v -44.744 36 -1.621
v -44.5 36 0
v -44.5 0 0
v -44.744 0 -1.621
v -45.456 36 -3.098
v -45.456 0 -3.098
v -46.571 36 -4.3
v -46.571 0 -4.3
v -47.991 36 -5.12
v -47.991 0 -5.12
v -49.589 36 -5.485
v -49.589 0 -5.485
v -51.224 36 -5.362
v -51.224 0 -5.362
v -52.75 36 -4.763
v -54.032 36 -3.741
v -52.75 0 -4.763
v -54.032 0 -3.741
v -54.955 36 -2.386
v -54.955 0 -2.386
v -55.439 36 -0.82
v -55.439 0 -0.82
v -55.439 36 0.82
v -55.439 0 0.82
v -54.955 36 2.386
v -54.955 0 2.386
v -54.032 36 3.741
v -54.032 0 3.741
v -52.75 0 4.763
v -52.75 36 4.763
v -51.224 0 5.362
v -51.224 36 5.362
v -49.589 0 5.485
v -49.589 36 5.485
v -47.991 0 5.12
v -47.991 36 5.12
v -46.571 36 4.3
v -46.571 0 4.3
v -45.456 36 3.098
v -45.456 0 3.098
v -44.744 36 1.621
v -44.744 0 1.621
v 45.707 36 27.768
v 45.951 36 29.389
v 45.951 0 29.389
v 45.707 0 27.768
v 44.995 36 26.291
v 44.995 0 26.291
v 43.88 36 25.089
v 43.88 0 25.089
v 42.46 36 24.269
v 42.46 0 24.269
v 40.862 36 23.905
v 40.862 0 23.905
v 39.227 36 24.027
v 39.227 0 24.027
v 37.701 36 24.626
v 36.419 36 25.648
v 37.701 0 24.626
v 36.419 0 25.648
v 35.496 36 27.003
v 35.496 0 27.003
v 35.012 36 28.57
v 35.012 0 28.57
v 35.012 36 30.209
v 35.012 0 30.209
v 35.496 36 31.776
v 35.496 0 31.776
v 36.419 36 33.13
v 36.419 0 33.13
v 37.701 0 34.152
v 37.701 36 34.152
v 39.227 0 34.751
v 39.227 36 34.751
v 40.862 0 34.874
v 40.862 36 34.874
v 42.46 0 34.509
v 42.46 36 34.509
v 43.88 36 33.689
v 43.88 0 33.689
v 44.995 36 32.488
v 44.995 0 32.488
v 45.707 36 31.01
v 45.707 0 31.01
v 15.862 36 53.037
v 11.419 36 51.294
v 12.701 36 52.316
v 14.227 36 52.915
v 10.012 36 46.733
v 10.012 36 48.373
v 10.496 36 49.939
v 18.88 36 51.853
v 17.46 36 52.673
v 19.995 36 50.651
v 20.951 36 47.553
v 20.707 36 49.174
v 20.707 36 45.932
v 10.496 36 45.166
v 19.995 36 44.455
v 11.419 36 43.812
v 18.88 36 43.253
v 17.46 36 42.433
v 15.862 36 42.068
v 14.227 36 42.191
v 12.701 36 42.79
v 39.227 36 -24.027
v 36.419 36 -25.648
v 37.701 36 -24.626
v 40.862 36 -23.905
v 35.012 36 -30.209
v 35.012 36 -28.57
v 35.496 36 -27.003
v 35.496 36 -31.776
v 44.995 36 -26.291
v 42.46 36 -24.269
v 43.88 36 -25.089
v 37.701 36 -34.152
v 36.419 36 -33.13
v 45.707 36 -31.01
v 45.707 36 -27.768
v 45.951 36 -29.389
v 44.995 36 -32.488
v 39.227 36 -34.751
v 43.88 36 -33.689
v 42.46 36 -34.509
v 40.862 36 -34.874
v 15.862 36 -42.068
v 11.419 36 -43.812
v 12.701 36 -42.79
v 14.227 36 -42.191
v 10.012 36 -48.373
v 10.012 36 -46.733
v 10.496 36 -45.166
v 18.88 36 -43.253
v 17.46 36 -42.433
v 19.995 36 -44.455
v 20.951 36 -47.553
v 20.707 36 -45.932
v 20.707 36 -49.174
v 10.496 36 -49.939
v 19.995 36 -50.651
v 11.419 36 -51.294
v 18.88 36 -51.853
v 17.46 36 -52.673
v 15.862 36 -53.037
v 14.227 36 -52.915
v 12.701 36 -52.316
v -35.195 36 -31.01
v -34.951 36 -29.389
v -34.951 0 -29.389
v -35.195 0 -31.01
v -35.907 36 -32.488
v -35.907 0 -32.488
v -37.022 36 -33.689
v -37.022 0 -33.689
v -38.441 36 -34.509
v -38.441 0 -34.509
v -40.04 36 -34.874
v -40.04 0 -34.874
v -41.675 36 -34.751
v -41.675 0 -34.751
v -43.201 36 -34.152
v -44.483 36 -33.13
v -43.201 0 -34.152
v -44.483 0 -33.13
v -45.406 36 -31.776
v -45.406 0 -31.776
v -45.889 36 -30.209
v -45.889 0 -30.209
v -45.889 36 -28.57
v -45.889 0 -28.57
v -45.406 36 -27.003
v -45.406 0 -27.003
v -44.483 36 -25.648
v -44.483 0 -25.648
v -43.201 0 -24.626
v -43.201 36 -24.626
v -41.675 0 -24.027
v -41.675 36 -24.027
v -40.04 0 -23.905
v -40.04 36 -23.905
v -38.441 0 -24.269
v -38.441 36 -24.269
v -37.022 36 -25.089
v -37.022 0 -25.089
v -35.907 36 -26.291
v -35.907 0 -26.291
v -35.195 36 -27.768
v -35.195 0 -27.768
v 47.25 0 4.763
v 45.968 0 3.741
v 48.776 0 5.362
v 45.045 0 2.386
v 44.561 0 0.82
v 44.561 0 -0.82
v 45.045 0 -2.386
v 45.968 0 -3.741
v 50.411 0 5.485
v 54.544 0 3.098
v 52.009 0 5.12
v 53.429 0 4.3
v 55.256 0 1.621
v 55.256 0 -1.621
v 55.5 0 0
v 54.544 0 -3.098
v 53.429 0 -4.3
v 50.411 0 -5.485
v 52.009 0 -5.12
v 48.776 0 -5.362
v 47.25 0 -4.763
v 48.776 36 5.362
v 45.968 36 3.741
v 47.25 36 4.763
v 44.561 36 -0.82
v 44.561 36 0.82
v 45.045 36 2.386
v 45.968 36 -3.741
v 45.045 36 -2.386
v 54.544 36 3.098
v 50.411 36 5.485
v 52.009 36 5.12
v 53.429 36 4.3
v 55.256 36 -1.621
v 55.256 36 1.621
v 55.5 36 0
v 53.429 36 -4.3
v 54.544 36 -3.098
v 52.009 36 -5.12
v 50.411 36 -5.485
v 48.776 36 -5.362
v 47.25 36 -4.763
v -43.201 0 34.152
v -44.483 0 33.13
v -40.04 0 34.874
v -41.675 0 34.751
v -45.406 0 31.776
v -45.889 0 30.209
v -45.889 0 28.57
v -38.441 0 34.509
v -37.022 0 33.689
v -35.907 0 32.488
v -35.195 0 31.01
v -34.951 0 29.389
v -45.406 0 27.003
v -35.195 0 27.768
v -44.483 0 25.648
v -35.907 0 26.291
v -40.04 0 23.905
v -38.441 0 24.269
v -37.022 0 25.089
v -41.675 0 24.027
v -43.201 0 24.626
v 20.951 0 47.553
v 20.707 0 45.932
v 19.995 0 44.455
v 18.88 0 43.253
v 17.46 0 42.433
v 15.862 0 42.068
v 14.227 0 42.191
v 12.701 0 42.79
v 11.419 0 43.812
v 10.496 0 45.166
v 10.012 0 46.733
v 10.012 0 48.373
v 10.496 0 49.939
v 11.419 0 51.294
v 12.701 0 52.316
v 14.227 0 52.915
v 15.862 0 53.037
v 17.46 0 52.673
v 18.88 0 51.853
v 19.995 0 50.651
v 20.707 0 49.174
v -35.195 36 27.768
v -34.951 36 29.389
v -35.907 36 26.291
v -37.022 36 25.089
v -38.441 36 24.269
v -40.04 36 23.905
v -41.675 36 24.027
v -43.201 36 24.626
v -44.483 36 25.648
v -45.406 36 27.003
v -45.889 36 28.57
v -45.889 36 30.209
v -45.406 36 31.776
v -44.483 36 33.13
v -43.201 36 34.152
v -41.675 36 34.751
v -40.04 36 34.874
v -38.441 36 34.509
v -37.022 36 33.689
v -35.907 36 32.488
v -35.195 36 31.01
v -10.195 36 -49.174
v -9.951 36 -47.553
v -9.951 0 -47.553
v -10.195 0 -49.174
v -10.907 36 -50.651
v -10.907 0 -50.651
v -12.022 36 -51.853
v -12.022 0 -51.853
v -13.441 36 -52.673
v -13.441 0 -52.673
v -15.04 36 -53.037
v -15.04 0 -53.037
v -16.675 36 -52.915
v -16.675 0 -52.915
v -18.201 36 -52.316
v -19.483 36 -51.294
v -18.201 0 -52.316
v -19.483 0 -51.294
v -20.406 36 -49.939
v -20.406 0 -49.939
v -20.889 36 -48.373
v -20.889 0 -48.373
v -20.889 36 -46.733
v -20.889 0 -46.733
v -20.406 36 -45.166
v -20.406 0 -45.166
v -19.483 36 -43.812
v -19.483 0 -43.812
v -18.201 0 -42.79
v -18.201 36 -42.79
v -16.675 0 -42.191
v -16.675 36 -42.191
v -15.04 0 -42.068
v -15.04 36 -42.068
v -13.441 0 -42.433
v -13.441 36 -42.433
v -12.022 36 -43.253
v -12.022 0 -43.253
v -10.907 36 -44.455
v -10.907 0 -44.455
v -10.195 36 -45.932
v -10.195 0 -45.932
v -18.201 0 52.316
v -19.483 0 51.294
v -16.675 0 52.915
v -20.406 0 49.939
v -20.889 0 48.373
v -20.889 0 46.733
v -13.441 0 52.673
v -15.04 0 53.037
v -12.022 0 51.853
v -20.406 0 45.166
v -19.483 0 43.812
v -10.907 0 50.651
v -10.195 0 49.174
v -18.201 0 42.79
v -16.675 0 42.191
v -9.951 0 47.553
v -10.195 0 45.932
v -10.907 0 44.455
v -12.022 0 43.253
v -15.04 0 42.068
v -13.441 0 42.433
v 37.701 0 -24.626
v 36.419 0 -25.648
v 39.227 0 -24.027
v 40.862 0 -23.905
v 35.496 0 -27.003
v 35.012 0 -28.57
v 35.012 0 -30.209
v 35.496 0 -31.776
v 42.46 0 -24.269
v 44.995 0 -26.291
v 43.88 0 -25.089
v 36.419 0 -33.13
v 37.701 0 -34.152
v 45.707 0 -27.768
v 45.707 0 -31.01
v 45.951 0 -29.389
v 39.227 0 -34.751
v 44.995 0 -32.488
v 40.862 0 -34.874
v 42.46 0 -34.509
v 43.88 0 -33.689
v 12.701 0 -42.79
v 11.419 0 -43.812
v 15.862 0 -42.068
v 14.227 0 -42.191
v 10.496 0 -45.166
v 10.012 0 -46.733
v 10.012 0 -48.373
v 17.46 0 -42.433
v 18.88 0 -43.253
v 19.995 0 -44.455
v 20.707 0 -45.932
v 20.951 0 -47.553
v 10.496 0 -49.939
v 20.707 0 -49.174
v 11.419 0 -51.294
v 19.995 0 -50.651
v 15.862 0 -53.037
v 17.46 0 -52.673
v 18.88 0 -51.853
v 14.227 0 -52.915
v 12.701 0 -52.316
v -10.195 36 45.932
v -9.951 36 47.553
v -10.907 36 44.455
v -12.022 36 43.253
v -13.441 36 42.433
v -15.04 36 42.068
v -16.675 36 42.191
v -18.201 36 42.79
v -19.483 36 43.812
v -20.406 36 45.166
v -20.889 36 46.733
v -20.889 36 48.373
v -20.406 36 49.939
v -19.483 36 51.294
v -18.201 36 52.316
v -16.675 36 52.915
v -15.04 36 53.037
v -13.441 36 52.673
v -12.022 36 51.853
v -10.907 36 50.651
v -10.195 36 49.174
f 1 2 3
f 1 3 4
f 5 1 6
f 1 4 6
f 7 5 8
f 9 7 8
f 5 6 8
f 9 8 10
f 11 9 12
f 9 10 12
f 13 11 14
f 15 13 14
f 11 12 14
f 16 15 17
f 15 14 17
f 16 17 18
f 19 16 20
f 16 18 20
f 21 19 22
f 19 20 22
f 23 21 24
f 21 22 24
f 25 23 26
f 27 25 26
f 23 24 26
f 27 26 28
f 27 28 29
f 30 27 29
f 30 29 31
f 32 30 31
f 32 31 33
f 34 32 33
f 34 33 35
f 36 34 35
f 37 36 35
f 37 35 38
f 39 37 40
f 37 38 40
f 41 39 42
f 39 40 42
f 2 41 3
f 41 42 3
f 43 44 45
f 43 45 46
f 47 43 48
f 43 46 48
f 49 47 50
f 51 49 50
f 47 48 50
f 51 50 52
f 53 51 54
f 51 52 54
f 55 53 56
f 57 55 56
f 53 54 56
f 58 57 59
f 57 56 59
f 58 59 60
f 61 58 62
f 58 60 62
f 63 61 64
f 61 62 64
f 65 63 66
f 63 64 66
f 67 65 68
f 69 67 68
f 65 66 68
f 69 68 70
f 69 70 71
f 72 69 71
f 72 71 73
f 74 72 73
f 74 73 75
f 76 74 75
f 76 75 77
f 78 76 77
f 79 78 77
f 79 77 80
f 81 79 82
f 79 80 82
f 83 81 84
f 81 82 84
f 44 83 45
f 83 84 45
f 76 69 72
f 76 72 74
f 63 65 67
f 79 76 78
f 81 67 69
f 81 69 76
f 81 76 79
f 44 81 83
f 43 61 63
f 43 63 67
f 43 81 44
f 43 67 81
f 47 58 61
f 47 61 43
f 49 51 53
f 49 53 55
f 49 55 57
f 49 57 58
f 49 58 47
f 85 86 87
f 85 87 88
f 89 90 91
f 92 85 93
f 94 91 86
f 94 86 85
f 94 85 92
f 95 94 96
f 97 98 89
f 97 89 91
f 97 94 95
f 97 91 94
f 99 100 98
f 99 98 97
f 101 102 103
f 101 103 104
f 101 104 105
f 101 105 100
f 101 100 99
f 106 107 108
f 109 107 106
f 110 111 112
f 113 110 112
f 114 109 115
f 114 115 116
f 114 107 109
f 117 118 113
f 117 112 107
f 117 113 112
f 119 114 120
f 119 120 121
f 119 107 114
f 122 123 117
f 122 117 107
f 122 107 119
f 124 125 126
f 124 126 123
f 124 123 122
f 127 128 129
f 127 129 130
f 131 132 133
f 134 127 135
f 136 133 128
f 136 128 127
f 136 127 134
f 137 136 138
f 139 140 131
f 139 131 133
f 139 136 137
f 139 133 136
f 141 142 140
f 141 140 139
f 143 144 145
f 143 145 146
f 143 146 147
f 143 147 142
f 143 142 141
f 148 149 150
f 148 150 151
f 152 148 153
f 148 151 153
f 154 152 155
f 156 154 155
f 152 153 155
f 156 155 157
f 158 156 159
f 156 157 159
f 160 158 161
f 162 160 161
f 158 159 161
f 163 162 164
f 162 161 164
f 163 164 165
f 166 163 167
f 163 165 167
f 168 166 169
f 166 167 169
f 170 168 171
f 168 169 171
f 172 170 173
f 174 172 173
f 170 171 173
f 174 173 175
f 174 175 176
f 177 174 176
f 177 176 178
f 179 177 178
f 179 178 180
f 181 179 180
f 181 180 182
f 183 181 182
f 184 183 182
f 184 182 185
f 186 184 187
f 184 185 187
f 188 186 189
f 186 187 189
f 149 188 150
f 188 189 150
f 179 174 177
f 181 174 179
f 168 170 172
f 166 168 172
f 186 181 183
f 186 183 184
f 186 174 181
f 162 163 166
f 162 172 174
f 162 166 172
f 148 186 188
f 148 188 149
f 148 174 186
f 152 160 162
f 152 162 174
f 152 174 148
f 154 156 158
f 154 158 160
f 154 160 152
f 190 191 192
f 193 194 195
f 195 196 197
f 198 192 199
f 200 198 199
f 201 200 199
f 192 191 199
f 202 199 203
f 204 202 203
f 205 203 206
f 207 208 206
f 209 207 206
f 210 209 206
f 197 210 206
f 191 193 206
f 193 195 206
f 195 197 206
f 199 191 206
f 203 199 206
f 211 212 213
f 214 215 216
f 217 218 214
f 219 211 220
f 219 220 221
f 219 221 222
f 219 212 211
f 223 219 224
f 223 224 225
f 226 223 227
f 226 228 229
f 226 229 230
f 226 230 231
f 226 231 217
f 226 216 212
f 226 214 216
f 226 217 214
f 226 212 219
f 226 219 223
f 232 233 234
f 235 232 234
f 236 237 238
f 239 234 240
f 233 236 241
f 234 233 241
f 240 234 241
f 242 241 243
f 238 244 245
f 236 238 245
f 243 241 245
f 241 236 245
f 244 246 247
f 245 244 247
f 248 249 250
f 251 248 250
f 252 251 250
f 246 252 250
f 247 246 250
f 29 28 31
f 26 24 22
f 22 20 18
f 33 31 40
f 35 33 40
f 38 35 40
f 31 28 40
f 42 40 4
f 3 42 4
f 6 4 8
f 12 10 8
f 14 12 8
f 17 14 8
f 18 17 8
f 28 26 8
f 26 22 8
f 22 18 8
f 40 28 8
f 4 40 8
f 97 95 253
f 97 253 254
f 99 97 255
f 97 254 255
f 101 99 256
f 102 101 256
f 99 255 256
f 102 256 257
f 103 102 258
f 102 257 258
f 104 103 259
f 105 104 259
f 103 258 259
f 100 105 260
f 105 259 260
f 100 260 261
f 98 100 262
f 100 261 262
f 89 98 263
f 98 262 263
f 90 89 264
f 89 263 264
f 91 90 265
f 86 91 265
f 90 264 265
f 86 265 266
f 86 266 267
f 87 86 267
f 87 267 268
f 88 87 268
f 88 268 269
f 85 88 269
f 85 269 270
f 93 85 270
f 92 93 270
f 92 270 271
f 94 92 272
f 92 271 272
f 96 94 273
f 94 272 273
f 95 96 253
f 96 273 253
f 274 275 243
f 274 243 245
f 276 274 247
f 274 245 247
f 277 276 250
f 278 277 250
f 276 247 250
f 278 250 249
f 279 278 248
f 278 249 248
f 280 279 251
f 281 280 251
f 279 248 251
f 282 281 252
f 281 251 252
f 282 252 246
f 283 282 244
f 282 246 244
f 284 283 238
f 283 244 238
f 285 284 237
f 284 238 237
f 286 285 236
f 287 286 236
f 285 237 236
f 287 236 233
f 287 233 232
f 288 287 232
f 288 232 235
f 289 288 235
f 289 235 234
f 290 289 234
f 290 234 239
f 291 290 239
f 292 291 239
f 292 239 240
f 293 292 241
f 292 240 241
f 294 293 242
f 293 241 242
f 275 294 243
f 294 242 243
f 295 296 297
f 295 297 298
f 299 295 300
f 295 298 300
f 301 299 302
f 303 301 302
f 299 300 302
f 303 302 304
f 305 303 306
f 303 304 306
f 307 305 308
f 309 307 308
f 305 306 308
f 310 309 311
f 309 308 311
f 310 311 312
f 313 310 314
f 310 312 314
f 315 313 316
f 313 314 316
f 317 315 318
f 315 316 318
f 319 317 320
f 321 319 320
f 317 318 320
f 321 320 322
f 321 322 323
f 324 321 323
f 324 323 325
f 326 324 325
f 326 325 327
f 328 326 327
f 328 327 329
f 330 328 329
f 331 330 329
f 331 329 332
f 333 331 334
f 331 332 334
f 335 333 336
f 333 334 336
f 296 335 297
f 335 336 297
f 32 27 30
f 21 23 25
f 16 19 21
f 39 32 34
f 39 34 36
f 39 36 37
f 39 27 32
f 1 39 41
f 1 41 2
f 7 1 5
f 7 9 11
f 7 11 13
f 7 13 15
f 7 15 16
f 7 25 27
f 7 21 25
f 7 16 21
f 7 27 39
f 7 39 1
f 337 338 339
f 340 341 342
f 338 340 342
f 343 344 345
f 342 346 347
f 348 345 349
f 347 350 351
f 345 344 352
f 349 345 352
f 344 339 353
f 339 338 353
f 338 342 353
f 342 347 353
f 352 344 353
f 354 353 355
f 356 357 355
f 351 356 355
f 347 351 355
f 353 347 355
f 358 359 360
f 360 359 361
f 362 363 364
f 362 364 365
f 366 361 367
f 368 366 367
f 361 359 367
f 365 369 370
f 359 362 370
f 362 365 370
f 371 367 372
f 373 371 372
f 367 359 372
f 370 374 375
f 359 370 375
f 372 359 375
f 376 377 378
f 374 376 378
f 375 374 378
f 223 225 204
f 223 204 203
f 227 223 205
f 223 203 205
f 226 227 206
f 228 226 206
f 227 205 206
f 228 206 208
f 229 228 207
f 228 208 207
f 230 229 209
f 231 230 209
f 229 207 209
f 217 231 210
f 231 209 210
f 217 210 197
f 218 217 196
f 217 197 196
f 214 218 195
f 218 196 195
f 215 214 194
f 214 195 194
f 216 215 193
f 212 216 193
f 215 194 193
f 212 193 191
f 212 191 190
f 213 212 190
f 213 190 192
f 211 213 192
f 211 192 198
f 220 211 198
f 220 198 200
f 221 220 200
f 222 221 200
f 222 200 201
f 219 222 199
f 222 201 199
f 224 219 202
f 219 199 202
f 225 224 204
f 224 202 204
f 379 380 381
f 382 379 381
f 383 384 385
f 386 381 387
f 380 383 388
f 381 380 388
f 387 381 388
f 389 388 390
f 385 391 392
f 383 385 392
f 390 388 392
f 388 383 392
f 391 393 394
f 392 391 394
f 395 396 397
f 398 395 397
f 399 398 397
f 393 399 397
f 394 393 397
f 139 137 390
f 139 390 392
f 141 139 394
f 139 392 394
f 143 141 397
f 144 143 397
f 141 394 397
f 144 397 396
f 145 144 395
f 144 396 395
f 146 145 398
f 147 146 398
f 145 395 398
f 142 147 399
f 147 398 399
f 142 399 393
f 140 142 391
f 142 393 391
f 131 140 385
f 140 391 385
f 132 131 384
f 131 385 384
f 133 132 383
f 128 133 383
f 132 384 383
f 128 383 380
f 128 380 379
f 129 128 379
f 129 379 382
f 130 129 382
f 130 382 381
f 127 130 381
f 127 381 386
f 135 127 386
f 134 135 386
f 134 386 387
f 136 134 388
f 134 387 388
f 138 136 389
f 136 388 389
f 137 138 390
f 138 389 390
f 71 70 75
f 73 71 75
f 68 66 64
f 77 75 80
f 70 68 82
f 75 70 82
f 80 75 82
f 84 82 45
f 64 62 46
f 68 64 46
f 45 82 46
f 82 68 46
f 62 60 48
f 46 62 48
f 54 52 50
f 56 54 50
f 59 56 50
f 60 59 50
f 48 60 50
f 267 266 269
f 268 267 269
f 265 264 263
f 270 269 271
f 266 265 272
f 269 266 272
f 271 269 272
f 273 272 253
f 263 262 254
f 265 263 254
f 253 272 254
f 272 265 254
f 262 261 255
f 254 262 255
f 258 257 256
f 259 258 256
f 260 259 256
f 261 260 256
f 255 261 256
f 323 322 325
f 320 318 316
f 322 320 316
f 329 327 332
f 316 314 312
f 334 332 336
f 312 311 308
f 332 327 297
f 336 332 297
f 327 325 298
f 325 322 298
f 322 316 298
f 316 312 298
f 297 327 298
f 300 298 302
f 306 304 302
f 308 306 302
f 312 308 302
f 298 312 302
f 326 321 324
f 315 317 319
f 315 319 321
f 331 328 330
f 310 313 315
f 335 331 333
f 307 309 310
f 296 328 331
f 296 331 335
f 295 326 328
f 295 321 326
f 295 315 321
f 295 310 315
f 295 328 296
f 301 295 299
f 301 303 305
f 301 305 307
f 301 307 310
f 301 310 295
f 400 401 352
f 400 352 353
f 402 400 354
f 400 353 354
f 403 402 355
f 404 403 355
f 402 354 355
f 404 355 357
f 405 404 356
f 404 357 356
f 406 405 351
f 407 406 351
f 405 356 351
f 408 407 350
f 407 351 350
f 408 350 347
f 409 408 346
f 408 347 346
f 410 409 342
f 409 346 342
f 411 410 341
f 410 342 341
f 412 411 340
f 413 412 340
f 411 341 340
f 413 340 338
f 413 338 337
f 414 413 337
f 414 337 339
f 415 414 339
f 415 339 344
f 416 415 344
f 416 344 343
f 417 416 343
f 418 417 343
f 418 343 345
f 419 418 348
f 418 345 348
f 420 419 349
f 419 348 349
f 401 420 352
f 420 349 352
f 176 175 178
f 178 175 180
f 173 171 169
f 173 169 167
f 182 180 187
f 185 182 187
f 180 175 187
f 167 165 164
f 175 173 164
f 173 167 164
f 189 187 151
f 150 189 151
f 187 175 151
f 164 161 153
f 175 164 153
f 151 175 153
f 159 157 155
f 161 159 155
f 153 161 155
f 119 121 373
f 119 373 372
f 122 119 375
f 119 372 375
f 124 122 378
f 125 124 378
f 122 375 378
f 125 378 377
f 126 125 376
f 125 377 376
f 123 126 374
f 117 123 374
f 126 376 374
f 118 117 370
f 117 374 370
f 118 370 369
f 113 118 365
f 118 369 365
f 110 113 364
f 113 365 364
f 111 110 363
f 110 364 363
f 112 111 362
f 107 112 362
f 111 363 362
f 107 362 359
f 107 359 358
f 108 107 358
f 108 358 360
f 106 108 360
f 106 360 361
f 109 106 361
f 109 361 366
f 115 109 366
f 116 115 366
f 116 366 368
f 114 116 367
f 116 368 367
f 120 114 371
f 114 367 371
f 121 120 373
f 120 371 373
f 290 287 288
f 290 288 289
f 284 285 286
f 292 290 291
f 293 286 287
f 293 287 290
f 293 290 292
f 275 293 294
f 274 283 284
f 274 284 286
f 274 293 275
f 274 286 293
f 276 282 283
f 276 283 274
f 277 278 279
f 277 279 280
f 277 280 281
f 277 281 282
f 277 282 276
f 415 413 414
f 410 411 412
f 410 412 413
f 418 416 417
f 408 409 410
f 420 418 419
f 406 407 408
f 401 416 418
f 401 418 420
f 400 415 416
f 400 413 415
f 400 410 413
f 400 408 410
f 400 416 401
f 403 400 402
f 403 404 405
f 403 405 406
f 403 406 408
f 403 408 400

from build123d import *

# Parameters (mm, degrees)
SKETCH1_R              = 5.5
BOSS_EXTRUDE1_DEPTH    = 36
BOSS_EXTRUDE1_2_DEPTH  = 36
BOSS_EXTRUDE1_3_DEPTH  = 36
BOSS_EXTRUDE1_4_DEPTH  = 36
BOSS_EXTRUDE1_5_DEPTH  = 36
BOSS_EXTRUDE1_6_DEPTH  = 36
BOSS_EXTRUDE1_7_DEPTH  = 36
BOSS_EXTRUDE1_8_DEPTH  = 36
BOSS_EXTRUDE1_9_DEPTH  = 36
BOSS_EXTRUDE1_10_DEPTH = 36


with BuildPart() as part:
    # Sketch1 → Boss-Extrude1 (new body)
    with BuildSketch(Plane(origin=(0, 0, 0), x_dir=(1, 0, 0), z_dir=(0, 1, 0))):
        with Locations((50, 0)):
            Circle(SKETCH1_R)
    extrude(amount=BOSS_EXTRUDE1_DEPTH)


with BuildPart() as body_2:
    # Sketch1 → Boss-Extrude1 2 (new body)
    with BuildSketch(Plane(origin=(0, 0, 0), x_dir=(1, 0, 0), z_dir=(0, 1, 0))):
        with Locations((40.450849719, -29.389262615)):
            Circle(SKETCH1_R)
    extrude(amount=BOSS_EXTRUDE1_2_DEPTH)


with BuildPart() as body_3:
    # Sketch1 → Boss-Extrude1 3 (new body)
    with BuildSketch(Plane(origin=(0, 0, 0), x_dir=(1, 0, 0), z_dir=(0, 1, 0))):
        with Locations((15.450849719, -47.552825815)):
            Circle(SKETCH1_R)
    extrude(amount=BOSS_EXTRUDE1_3_DEPTH)


with BuildPart() as body_4:
    # Sketch1 → Boss-Extrude1 4 (new body)
    with BuildSketch(Plane(origin=(0, 0, 0), x_dir=(1, 0, 0), z_dir=(0, 1, 0))):
        with Locations((-15.450849719, -47.552825815)):
            Circle(SKETCH1_R)
    extrude(amount=BOSS_EXTRUDE1_4_DEPTH)


with BuildPart() as body_5:
    # Sketch1 → Boss-Extrude1 5 (new body)
    with BuildSketch(Plane(origin=(0, 0, 0), x_dir=(1, 0, 0), z_dir=(0, 1, 0))):
        with Locations((-40.450849719, -29.389262615)):
            Circle(SKETCH1_R)
    extrude(amount=BOSS_EXTRUDE1_5_DEPTH)


with BuildPart() as body_6:
    # Sketch1 → Boss-Extrude1 6 (new body)
    with BuildSketch(Plane(origin=(0, 0, 0), x_dir=(1, 0, 0), z_dir=(0, 1, 0))):
        with Locations((-50, 0)):
            Circle(SKETCH1_R)
    extrude(amount=BOSS_EXTRUDE1_6_DEPTH)


with BuildPart() as body_7:
    # Sketch1 → Boss-Extrude1 7 (new body)
    with BuildSketch(Plane(origin=(0, 0, 0), x_dir=(1, 0, 0), z_dir=(0, 1, 0))):
        with Locations((-40.450849719, 29.389262615)):
            Circle(SKETCH1_R)
    extrude(amount=BOSS_EXTRUDE1_7_DEPTH)


with BuildPart() as body_8:
    # Sketch1 → Boss-Extrude1 8 (new body)
    with BuildSketch(Plane(origin=(0, 0, 0), x_dir=(1, 0, 0), z_dir=(0, 1, 0))):
        with Locations((-15.450849719, 47.552825815)):
            Circle(SKETCH1_R)
    extrude(amount=BOSS_EXTRUDE1_8_DEPTH)


with BuildPart() as body_9:
    # Sketch1 → Boss-Extrude1 9 (new body)
    with BuildSketch(Plane(origin=(0, 0, 0), x_dir=(1, 0, 0), z_dir=(0, 1, 0))):
        with Locations((15.450849719, 47.552825815)):
            Circle(SKETCH1_R)
    extrude(amount=BOSS_EXTRUDE1_9_DEPTH)


with BuildPart() as body_10:
    # Sketch1 → Boss-Extrude1 10 (new body)
    with BuildSketch(Plane(origin=(0, 0, 0), x_dir=(1, 0, 0), z_dir=(0, 1, 0))):
        with Locations((40.450849719, 29.389262615)):
            Circle(SKETCH1_R)
    extrude(amount=BOSS_EXTRUDE1_10_DEPTH)


solid = Compound([part.part, body_2.part, body_3.part, body_4.part, body_5.part, body_6.part, body_7.part, body_8.part, body_9.part, body_10.part])
